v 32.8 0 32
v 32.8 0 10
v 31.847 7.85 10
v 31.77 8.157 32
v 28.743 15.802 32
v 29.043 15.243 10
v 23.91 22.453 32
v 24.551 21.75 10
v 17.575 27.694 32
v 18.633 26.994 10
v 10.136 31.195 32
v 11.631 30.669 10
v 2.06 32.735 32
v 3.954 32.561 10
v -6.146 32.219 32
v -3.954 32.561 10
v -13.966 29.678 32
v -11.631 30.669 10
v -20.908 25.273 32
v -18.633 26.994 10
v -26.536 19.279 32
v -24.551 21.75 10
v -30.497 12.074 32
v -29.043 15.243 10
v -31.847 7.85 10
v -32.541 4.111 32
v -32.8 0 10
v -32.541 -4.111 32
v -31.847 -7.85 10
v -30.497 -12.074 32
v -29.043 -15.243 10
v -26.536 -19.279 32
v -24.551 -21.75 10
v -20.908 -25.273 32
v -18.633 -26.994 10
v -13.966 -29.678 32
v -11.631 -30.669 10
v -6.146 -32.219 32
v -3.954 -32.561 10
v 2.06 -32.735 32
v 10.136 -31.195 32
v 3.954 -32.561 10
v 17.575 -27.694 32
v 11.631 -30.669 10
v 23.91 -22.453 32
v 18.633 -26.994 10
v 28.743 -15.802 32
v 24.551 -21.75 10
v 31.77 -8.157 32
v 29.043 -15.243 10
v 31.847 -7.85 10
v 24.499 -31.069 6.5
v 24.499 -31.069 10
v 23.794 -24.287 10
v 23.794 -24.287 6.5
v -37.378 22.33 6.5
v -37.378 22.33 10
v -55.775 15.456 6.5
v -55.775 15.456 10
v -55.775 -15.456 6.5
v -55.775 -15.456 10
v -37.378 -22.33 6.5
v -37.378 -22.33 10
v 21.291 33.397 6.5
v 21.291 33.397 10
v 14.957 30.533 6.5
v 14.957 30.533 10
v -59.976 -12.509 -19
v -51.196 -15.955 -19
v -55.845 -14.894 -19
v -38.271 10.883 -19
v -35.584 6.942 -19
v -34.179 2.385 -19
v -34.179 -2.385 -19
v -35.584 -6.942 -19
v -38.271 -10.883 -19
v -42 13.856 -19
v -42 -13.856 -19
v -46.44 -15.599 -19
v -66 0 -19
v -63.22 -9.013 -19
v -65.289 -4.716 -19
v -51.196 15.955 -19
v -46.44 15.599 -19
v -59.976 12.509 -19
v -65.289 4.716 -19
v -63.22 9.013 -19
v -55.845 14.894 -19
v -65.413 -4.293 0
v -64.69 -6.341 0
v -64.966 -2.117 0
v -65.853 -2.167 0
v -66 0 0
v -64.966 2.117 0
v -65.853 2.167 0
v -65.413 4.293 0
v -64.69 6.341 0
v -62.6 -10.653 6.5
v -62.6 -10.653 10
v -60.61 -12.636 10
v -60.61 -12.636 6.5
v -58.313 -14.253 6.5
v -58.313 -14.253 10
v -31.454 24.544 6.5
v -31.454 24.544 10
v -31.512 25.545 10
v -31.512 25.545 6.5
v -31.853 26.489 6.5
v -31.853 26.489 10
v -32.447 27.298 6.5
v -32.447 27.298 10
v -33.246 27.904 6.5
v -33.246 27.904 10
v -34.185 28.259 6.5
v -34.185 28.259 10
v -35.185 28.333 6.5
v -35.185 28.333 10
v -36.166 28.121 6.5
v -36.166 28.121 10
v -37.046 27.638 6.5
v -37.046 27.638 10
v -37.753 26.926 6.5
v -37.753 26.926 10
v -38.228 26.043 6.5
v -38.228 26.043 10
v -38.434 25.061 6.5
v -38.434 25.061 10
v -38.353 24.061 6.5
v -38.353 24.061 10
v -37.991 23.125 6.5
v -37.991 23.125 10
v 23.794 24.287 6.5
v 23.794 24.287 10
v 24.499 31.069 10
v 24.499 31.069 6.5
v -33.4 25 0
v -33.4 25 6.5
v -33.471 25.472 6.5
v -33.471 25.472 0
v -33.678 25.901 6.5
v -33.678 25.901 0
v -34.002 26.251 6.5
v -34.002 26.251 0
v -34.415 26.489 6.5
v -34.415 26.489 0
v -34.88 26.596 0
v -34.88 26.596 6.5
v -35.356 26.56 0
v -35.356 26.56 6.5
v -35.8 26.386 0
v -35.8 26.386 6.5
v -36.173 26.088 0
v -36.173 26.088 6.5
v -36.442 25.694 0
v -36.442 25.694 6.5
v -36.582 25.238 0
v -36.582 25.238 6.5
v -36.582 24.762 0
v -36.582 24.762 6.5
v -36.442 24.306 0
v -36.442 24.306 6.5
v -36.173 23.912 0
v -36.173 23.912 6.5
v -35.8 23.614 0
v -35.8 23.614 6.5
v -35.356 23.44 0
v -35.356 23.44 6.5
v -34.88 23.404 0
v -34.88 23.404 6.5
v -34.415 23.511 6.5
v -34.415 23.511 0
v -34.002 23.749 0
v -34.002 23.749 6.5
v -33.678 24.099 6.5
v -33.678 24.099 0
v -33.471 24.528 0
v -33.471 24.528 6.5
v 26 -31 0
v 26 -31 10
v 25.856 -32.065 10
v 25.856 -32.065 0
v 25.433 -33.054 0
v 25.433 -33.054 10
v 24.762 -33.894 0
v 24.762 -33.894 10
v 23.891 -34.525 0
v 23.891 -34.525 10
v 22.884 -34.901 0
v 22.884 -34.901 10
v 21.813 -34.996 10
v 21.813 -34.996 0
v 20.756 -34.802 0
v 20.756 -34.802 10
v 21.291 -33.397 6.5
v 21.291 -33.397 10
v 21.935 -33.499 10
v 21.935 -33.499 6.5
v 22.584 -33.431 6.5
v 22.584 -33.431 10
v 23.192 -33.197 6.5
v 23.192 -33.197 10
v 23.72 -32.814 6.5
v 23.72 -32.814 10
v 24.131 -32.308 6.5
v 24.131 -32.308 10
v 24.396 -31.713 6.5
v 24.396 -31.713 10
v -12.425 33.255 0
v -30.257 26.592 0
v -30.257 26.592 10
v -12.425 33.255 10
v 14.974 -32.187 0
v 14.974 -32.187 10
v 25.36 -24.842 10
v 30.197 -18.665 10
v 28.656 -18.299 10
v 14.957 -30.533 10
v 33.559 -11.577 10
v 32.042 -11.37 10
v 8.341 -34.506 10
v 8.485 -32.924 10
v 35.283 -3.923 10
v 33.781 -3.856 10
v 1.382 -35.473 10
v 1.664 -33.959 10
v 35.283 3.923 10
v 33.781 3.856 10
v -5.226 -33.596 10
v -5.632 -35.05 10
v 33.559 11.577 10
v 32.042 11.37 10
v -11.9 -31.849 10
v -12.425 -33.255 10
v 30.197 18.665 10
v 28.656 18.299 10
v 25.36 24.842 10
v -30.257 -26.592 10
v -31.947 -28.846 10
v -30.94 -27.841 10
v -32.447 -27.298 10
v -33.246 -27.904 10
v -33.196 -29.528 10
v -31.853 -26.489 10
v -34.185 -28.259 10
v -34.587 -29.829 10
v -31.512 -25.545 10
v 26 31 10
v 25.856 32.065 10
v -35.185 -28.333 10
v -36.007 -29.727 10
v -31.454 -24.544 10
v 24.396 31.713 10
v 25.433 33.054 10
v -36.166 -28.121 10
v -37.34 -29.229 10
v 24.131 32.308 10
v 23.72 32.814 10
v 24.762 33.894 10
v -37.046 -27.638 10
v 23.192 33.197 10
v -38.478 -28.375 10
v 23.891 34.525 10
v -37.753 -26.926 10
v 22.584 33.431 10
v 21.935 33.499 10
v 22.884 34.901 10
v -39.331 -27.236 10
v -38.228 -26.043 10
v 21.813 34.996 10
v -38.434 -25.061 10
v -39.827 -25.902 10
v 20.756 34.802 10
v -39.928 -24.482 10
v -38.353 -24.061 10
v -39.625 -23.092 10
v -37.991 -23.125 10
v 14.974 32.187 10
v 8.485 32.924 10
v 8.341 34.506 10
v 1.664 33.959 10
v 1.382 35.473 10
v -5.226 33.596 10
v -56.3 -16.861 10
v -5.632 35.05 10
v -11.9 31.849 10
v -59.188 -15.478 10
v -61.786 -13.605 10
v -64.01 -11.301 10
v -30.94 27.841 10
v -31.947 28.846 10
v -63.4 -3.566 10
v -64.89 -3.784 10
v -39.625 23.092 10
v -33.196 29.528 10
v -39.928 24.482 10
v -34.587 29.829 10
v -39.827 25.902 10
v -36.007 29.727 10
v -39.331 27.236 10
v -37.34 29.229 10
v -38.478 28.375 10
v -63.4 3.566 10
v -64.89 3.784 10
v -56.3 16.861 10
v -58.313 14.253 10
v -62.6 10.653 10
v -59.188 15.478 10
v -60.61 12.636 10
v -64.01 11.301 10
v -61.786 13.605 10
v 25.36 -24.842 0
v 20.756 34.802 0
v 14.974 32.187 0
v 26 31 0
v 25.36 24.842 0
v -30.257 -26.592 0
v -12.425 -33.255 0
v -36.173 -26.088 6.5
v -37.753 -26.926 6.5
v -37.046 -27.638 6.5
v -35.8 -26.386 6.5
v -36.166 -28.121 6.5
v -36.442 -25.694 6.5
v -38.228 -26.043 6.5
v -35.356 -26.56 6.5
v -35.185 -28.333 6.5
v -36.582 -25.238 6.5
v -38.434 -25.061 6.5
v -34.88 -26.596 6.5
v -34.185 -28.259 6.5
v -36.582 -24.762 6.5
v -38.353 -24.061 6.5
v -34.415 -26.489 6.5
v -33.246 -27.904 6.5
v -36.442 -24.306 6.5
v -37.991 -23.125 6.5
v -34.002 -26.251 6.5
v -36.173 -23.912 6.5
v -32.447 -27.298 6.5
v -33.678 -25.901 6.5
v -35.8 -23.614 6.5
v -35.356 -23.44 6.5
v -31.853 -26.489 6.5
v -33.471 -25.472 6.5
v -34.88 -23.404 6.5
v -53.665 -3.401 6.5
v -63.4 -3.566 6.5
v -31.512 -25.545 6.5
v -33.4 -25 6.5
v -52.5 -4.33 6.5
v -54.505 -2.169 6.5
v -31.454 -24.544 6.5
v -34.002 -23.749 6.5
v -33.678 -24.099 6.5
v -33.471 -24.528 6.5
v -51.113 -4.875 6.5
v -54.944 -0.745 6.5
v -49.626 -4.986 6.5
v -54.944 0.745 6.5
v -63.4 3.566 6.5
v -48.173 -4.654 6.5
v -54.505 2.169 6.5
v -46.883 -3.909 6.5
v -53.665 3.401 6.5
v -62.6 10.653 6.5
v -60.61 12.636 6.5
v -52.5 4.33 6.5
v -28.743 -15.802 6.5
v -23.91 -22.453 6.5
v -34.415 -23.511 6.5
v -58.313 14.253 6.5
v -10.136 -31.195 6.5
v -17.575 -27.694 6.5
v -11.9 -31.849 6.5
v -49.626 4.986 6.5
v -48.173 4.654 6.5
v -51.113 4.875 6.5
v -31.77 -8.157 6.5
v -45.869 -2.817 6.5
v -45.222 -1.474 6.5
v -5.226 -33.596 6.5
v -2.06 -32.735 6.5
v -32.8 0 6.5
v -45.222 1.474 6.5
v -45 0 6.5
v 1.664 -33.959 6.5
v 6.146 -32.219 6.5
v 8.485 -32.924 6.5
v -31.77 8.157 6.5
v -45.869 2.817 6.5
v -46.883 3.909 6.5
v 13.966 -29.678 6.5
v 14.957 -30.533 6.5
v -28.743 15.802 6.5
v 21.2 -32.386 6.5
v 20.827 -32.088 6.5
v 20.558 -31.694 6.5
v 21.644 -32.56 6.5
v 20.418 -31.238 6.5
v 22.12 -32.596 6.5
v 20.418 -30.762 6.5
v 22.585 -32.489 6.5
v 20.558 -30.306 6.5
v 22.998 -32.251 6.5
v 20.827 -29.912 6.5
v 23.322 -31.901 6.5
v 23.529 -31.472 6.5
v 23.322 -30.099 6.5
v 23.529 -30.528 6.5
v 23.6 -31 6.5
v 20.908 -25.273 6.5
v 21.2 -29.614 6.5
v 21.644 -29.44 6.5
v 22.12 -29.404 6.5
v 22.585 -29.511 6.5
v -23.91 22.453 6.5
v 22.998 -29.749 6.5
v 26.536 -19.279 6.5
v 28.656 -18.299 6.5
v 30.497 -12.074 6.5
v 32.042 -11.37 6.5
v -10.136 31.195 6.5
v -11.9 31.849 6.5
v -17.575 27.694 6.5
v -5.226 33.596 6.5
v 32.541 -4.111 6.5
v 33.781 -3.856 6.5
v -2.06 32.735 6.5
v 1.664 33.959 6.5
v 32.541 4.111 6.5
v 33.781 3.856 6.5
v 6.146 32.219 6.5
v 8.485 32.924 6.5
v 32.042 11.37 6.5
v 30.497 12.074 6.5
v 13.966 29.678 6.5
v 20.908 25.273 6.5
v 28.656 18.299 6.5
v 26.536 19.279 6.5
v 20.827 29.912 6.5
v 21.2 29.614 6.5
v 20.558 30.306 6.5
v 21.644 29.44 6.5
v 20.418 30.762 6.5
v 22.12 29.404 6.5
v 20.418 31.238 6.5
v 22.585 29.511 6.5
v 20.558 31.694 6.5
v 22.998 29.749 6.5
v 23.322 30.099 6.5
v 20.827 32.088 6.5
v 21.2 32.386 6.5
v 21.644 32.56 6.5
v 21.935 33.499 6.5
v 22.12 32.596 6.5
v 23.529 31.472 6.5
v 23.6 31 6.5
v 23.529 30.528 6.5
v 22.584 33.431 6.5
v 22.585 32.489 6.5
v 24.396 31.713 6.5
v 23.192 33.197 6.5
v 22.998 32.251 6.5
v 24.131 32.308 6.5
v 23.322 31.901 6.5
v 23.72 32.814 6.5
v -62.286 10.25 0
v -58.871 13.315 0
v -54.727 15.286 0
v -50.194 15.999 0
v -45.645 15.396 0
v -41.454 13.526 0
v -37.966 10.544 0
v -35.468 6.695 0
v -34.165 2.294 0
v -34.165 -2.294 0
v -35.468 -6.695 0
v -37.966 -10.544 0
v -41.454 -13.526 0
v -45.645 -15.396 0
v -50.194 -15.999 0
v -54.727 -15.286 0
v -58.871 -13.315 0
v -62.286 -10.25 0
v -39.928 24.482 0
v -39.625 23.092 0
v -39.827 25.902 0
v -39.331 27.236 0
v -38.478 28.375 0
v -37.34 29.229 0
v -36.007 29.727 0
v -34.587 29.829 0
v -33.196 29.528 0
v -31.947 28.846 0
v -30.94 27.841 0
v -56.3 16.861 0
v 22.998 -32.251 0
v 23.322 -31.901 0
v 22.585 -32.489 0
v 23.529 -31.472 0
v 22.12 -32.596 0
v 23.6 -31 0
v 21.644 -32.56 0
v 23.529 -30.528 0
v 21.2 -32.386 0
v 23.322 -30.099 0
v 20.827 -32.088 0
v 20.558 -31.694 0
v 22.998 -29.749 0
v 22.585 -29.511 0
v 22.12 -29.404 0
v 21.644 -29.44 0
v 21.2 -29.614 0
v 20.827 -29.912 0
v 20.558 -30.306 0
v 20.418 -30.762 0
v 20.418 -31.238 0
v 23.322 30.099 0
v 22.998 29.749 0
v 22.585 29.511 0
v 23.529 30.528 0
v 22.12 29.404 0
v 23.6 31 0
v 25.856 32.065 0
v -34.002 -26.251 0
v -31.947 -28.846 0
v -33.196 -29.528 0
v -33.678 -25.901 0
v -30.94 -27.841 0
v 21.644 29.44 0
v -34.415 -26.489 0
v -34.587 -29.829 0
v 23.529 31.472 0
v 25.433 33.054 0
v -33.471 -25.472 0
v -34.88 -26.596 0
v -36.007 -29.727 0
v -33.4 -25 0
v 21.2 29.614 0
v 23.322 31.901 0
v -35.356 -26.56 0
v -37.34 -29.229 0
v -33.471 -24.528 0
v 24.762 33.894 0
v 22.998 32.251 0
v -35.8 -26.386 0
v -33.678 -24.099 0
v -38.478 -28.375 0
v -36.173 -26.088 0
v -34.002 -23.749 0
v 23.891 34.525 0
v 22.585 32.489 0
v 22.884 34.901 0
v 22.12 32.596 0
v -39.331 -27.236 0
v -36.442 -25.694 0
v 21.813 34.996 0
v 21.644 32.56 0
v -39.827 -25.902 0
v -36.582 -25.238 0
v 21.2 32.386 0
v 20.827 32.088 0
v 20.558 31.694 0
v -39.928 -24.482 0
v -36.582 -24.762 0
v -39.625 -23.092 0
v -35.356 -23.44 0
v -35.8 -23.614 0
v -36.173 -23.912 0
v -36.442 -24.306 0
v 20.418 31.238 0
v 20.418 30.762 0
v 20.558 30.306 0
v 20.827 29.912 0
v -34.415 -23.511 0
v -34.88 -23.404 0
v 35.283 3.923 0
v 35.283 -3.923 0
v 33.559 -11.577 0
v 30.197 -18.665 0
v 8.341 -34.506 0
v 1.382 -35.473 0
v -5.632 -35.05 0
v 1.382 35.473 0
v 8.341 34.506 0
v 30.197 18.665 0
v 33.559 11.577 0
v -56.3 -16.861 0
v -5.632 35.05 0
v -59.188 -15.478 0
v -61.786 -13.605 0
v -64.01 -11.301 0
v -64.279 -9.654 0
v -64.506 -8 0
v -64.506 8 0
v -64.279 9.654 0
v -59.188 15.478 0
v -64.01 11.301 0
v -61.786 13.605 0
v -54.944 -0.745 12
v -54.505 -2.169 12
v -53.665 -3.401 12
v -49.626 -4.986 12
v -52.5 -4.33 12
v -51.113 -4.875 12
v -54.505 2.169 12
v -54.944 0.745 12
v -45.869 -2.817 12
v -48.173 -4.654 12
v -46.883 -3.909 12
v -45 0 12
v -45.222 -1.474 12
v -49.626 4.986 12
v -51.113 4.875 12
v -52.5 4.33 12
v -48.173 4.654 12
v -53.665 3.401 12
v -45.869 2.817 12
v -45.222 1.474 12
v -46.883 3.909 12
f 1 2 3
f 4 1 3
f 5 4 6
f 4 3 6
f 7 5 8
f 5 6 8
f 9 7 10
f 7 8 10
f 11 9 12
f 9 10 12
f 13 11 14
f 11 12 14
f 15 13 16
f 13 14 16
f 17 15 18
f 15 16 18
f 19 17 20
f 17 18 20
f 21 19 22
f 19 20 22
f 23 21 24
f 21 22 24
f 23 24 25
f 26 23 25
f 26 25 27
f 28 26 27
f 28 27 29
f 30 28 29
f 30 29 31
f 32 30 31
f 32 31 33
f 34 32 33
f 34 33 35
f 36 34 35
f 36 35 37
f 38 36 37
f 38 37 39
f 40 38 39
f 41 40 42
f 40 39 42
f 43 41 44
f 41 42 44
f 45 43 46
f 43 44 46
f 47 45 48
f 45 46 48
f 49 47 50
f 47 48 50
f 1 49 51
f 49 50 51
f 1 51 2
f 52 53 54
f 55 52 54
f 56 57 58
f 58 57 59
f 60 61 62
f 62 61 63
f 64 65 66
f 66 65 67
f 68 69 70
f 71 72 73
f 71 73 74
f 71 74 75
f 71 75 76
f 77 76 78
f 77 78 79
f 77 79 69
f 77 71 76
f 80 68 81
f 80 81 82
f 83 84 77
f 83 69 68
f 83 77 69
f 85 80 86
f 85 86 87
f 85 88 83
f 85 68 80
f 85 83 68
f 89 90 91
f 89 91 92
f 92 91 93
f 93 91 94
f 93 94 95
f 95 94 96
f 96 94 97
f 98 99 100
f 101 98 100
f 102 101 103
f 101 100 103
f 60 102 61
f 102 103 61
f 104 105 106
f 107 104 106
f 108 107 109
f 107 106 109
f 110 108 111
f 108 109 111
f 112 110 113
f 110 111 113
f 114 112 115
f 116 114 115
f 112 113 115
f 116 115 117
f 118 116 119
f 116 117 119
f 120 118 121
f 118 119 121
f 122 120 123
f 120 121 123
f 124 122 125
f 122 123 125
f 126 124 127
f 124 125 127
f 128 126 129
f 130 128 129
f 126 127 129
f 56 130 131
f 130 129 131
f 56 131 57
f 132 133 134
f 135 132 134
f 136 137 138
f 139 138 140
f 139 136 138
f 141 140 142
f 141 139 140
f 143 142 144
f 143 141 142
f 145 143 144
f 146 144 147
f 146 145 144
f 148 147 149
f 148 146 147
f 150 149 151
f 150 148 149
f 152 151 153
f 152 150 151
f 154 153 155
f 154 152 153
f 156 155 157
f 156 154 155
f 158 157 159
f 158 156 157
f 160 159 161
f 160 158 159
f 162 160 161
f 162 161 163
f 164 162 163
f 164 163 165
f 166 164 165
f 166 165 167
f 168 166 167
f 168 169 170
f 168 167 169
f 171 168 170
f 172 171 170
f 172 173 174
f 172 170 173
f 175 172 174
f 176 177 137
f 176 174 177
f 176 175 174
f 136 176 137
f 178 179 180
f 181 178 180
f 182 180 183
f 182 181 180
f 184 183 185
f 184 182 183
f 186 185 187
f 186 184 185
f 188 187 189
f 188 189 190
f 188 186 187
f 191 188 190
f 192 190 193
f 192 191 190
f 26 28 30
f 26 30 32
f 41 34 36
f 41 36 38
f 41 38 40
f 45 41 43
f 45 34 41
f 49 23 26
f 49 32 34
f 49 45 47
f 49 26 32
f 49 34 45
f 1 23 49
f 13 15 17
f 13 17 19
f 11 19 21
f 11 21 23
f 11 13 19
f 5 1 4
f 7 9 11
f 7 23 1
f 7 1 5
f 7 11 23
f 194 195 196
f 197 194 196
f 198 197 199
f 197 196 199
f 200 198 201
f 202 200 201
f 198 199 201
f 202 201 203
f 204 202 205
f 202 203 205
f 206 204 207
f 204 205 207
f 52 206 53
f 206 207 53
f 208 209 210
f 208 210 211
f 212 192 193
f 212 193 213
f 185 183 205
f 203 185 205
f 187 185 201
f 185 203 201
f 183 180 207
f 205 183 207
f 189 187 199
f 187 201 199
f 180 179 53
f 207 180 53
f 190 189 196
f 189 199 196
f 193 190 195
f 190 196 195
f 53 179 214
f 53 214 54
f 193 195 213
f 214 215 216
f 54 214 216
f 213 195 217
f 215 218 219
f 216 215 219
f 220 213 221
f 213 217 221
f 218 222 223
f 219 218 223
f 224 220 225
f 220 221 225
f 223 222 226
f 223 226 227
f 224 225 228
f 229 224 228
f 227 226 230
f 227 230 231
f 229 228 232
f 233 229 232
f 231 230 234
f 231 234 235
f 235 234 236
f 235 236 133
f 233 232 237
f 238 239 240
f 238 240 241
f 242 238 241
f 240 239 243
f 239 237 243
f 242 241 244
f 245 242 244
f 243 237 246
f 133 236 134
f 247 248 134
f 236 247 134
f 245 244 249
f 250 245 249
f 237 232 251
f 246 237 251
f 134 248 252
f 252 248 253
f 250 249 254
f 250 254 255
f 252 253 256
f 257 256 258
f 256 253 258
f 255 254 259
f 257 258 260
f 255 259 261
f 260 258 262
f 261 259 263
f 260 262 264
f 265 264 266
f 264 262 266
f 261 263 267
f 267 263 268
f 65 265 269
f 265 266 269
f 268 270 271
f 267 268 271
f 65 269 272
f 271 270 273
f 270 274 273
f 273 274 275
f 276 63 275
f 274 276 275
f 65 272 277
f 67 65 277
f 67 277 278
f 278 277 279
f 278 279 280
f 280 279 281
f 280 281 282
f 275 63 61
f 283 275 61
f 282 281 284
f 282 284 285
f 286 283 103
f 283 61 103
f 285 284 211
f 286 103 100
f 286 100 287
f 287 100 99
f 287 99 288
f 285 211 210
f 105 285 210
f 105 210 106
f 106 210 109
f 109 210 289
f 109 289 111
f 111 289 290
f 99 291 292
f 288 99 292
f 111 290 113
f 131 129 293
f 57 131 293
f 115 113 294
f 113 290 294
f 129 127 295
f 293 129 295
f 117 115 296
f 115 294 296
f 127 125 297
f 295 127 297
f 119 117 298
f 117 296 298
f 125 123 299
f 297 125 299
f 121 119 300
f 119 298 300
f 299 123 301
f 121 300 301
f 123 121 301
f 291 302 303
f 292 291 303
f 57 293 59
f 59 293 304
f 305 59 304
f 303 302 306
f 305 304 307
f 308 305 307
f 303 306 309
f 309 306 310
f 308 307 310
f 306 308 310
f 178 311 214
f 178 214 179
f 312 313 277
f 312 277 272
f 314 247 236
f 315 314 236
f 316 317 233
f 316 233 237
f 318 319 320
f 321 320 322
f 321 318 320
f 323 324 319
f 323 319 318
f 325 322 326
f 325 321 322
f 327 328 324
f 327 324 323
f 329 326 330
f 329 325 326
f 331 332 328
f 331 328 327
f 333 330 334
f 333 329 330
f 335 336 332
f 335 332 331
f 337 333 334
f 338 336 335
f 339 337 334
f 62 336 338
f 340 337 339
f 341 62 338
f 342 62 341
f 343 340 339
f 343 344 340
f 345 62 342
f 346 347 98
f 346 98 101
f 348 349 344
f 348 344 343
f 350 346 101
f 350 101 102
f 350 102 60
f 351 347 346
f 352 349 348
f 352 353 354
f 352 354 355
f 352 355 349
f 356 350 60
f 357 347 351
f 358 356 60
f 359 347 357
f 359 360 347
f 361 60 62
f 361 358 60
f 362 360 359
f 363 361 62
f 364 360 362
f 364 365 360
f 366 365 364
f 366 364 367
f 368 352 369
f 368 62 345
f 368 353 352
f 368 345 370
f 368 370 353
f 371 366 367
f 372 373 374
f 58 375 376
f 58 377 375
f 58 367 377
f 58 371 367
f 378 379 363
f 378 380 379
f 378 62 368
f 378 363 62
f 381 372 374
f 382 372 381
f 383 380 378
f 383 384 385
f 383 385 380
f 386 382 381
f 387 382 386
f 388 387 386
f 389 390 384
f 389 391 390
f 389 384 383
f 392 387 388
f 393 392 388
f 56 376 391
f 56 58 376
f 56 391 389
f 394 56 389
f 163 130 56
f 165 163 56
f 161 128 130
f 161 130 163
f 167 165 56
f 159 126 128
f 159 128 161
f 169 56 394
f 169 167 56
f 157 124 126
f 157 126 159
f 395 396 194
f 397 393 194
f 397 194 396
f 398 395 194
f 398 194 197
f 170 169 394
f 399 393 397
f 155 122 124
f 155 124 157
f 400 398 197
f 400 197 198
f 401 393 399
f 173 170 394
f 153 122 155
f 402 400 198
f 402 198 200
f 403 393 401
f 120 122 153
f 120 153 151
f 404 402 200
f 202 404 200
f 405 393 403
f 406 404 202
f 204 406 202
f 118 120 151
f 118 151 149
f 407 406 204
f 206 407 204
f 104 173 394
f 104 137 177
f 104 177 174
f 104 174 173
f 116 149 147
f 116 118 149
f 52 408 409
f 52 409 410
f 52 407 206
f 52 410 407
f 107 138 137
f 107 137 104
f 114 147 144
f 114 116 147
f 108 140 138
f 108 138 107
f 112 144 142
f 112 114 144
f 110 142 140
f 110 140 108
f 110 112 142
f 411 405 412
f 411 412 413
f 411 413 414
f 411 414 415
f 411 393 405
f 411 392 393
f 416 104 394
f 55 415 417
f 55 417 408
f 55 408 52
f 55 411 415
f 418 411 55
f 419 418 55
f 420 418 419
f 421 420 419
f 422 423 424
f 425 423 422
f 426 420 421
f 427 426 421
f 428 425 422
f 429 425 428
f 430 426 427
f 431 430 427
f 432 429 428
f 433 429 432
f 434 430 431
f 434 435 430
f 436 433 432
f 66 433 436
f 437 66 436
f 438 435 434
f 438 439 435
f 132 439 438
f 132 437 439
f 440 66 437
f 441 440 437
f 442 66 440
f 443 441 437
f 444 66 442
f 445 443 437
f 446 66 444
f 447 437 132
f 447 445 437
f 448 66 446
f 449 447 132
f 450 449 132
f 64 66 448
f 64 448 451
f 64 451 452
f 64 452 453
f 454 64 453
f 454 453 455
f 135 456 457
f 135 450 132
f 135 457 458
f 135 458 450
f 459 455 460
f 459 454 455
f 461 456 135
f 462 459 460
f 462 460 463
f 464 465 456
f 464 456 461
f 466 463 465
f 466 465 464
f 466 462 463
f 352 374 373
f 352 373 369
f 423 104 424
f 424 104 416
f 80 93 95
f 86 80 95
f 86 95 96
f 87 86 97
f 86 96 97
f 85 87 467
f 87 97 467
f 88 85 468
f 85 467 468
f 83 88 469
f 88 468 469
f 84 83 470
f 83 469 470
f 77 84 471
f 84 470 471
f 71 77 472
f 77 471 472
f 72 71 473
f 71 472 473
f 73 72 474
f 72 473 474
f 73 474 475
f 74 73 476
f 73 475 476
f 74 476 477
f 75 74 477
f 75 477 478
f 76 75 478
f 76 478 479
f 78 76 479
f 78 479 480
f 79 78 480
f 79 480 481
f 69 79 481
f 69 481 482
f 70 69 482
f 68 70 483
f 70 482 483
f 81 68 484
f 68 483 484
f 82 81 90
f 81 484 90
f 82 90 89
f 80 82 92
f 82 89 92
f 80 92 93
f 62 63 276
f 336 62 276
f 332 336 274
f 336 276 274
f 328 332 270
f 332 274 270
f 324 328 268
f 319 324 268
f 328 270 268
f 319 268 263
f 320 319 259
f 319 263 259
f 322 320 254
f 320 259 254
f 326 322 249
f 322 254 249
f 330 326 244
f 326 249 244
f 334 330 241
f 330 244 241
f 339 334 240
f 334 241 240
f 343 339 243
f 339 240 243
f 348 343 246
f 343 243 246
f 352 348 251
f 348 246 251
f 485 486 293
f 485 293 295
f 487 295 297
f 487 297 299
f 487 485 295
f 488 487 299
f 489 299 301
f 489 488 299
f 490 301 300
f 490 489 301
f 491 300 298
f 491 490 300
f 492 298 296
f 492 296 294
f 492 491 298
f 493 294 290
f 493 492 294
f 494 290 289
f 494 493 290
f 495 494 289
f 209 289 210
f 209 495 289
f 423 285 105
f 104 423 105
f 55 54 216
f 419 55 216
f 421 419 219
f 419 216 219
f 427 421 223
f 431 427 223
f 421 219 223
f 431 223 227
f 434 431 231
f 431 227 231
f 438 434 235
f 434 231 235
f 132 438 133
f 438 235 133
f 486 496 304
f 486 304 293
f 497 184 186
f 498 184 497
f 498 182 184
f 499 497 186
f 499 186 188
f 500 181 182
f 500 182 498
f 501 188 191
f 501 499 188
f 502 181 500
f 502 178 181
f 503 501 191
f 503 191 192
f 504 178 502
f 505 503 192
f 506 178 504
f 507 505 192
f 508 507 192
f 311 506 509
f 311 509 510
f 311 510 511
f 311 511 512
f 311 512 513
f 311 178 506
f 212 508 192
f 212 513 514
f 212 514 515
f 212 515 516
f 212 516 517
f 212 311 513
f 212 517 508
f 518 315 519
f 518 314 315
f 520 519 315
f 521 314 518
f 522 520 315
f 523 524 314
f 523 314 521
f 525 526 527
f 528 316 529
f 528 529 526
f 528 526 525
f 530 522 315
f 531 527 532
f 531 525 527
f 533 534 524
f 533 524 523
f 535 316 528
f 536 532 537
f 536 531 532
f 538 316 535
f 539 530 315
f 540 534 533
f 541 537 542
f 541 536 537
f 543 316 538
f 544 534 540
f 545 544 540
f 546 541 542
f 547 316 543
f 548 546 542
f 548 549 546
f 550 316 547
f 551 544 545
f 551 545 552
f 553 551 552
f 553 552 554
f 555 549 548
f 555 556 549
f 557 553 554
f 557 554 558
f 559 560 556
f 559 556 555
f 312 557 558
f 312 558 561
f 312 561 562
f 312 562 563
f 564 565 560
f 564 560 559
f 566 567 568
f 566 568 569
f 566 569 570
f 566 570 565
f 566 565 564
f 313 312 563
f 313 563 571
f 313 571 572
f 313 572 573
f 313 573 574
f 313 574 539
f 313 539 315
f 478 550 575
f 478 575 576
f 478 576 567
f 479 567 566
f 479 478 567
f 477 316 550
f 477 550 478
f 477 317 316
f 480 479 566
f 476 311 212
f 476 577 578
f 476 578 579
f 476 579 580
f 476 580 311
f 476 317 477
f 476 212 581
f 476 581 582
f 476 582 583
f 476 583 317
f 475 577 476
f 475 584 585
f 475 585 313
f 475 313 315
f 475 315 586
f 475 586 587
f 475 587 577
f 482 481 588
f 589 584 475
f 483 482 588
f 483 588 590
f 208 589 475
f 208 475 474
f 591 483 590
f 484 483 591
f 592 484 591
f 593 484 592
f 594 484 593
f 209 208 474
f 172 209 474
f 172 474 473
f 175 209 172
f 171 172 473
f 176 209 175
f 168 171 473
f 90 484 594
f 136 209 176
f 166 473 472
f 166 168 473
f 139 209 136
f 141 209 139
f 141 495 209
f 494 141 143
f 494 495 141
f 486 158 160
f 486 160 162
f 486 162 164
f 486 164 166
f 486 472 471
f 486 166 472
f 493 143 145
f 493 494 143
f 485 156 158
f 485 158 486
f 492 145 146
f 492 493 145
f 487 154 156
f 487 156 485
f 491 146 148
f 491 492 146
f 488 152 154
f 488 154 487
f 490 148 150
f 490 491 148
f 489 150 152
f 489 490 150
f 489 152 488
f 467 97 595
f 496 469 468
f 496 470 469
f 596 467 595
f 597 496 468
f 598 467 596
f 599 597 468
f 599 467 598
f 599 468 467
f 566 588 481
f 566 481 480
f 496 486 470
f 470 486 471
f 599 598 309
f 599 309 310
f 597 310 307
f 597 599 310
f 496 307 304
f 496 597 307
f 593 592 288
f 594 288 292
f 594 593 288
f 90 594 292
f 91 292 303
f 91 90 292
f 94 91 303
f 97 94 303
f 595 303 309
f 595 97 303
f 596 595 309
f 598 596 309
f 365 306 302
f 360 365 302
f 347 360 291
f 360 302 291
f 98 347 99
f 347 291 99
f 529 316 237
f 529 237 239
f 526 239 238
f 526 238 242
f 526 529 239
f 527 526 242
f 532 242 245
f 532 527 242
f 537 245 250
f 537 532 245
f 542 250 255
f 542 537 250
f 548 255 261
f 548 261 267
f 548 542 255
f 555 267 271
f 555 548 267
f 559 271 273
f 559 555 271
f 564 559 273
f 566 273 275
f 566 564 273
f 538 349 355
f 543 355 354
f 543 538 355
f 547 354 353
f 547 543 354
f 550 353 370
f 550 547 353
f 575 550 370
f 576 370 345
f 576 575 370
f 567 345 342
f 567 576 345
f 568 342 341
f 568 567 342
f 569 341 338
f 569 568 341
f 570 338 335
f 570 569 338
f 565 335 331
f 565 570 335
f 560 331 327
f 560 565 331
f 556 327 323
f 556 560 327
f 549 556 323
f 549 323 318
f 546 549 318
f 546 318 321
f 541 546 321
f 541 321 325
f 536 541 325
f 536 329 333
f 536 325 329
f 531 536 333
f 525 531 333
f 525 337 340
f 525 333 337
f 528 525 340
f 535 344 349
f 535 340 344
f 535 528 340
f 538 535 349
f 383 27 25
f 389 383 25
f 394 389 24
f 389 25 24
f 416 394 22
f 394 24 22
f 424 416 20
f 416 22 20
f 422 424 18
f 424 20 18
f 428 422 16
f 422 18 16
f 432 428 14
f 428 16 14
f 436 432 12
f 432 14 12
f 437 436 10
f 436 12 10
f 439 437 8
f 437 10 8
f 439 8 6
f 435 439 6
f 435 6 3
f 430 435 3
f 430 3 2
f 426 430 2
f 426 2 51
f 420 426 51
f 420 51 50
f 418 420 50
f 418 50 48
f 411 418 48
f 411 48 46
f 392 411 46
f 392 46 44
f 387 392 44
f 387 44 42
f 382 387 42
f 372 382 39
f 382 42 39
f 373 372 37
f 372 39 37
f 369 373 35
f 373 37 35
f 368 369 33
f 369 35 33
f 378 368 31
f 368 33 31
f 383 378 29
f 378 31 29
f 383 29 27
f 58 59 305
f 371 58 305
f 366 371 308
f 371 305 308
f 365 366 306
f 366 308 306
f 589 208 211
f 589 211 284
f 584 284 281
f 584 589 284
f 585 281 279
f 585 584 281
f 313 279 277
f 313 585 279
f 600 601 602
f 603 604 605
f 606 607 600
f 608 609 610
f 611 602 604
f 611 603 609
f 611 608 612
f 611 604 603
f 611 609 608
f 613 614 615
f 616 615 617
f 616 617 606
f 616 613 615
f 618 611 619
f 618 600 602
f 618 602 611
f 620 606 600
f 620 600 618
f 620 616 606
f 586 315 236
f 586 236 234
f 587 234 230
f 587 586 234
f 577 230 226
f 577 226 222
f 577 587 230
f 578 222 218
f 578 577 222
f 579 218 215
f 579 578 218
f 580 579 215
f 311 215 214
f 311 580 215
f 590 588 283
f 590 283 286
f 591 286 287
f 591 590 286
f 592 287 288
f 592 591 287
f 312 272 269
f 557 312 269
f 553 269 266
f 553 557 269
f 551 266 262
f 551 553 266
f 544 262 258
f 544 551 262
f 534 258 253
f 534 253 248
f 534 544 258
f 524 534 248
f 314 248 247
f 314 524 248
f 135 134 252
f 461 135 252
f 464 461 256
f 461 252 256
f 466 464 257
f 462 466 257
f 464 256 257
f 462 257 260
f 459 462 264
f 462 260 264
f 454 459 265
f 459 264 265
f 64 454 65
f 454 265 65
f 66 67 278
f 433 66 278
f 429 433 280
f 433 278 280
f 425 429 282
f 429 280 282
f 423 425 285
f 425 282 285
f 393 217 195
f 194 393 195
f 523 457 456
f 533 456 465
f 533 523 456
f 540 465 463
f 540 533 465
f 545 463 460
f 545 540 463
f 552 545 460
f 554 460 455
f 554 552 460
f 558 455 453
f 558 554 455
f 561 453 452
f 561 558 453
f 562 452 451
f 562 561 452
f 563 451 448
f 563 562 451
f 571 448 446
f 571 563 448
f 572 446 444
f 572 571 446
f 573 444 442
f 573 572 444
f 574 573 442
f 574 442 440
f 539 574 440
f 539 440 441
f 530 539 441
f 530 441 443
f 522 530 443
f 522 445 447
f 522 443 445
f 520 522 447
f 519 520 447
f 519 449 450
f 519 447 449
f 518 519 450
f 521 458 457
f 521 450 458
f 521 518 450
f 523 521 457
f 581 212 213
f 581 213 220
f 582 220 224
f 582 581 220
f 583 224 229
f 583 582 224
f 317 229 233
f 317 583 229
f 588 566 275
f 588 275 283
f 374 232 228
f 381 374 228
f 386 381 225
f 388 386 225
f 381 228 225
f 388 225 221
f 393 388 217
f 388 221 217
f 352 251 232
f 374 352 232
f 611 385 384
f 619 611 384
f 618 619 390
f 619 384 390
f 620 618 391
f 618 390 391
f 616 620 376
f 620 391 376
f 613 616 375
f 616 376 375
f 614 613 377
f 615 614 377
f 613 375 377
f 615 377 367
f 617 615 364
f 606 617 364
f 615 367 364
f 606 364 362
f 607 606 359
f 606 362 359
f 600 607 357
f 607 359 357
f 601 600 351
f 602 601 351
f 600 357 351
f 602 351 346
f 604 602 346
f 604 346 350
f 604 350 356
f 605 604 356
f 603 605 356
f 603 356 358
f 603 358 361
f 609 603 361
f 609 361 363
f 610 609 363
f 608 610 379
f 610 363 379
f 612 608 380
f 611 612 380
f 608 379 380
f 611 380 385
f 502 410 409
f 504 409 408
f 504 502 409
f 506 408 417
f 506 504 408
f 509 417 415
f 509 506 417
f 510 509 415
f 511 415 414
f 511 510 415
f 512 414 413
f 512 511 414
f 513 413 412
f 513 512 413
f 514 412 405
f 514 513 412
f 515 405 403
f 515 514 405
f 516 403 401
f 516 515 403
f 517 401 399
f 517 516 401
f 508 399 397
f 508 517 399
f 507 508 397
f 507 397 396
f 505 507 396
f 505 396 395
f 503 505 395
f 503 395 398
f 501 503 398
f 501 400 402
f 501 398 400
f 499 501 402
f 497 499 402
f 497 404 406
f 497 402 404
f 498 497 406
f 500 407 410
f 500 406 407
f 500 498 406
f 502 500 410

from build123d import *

# Parameters (mm, degrees)
ESQUISSE1_R             = 1.6
BOSS_EXTRU_1_DEPTH      = 10
ESQUISSE2_R             = 32.8
BOSS_EXTRU_2_DEPTH      = 22
ENL_V_MAT_EXTRU_1_DEPTH = 3.5
BOSS_EXTRU_3_REACH      = 12
ESQUISSE4_R             = 32.8
ESQUISSE5_R             = 16
BOSS_EXTRU_4_DEPTH      = 19
ESQUISSE8_R             = 5
BOSS_EXTRU_7_DEPTH      = 5.5


with BuildPart() as part:
    # Esquisse1 → Boss.-Extru.1 (new body)
    with BuildSketch(Plane.XY):
        with BuildLine():
            ThreePointArc((-56.3, -16.861494596), (-60.528670487, -14.599558136), (-64.01, -11.301322931))
            ThreePointArc((-64.01, -11.301322931), (-65, 0), (-64.01, 11.301322931))
            ThreePointArc((-64.01, 11.301322931), (-60.528670487, 14.599558136), (-56.3, 16.861494596))
            Line((-56.3, 16.861494596), (-39.624688626, 23.091930519))
            ThreePointArc((-39.624688626, 23.091930519), (-36.690940127, 29.525679018), (-30.257191628, 26.591930519))
            Line((-30.257191628, 26.591930519), (-12.425, 33.254614341))
            ThreePointArc((-12.425, 33.254614341), (1.381675102, 35.473102119), (14.973963383, 32.187426436))
            Line((14.973963383, 32.187426436), (20.756023105, 34.801647207))
            ThreePointArc((20.756023105, 34.801647207), (24.347774736, 34.238511045), (26, 31))
            Line((26, 31), (25.359978077, 24.841930519))
            ThreePointArc((25.359978077, 24.841930519), (35.5, 0), (25.359978077, -24.841930519))
            Line((25.359978077, -24.841930519), (26, -31))
            ThreePointArc((26, -31), (24.347774736, -34.238511045), (20.756023105, -34.801647207))
            Line((20.756023105, -34.801647207), (14.973963383, -32.187426436))
            ThreePointArc((14.973963383, -32.187426436), (1.381675102, -35.473102119), (-12.425, -33.254614341))
            Line((-12.425, -33.254614341), (-30.257191628, -26.591930519))
            ThreePointArc((-30.257191628, -26.591930519), (-36.690940127, -29.525679018), (-39.624688626, -23.091930519))
            Line((-39.624688626, -23.091930519), (-56.3, -16.861494596))
        make_face()
        with Locations((-35, -25)):
            Circle(ESQUISSE1_R, mode=Mode.SUBTRACT)
        with Locations((22, 31)):
            Circle(ESQUISSE1_R, mode=Mode.SUBTRACT)
        with Locations((-35, 25)):
            Circle(ESQUISSE1_R, mode=Mode.SUBTRACT)
        with Locations((22, -31)):
            Circle(ESQUISSE1_R, mode=Mode.SUBTRACT)
    extrude(amount=BOSS_EXTRU_1_DEPTH)

    # Esquisse2 → Boss.-Extru.2 (add)
    with BuildSketch(Plane.XY.offset(10)):
        Circle(ESQUISSE2_R)
    extrude(amount=BOSS_EXTRU_2_DEPTH)

    # Esquisse3 → Enlèv. mat.-Extru.1 (cut)
    with BuildSketch(Plane.XY.offset(10)):
        with BuildLine():
            Line((-55.775, -15.456370046), (-37.378202776, -22.330008789))
            ThreePointArc((-37.378202776, -22.330008789), (-36.165940127, -28.120554469), (-31.453677478, -24.543603151))
            Line((-31.453677478, -24.543603151), (-11.9, -31.849489792))
            ThreePointArc((-11.9, -31.849489792), (1.664031028, -33.959255009), (14.956816294, -30.533484019))
            Line((14.956816294, -30.533484019), (21.291141631, -33.397398551))
            ThreePointArc((21.291141631, -33.397398551), (23.468656713, -33.023128137), (24.499056843, -31.06866508))
            Line((24.499056843, -31.06866508), (23.79417774, -24.286562245))
            ThreePointArc((23.79417774, -24.286562245), (34, 0), (23.79417774, 24.286562245))
            Line((23.79417774, 24.286562245), (24.499056843, 31.06866508))
            ThreePointArc((24.499056843, 31.06866508), (23.468656713, 33.023128137), (21.291141631, 33.397398551))
            Line((21.291141631, 33.397398551), (14.956816294, 30.533484019))
            ThreePointArc((14.956816294, 30.533484019), (1.664031028, 33.959255009), (-11.9, 31.849489792))
            Line((-11.9, 31.849489792), (-31.453677478, 24.543603151))
            ThreePointArc((-31.453677478, 24.543603151), (-36.165940127, 28.120554469), (-37.378202776, 22.330008789))
            Line((-37.378202776, 22.330008789), (-55.775, 15.456370046))
            ThreePointArc((-55.775, 15.456370046), (-59.496201473, 13.493411636), (-62.6, 10.653168543))
            ThreePointArc((-62.6, 10.653168543), (-63.5, 0), (-62.6, -10.653168543))
            ThreePointArc((-62.6, -10.653168543), (-59.496201473, -13.493411636), (-55.775, -15.456370046))
        make_face()
    extrude(amount=-ENL_V_MAT_EXTRU_1_DEPTH, mode=Mode.SUBTRACT)

    # Esquisse4 → Boss.-Extru.3 (add, up to next)
    with BuildSketch(Plane(origin=(0, 0, 10), x_dir=(-1, 0, 0), z_dir=(0, 0, -1)), mode=Mode.PRIVATE) as boss_extru_3_sk1:
        Circle(ESQUISSE4_R)
    boss_extru_3_tool1 = extrude(boss_extru_3_sk1.sketch, amount=BOSS_EXTRU_3_REACH, mode=Mode.PRIVATE) - part.part
    add(boss_extru_3_tool1.solids().sort_by_distance((0, 0, 10))[0])

    # Esquisse5 → Boss.-Extru.4 (add)
    with BuildSketch(Plane(origin=(0, 0, 0), x_dir=(-1, 0, 0), z_dir=(0, 0, -1))):
        with Locations((50, 0)):
            Circle(ESQUISSE5_R)
    extrude(amount=BOSS_EXTRU_4_DEPTH)

    # Esquisse8 → Boss.-Extru.7 (add)
    with BuildSketch(Plane.XY.offset(6.5)):
        with Locations((-50, 0)):
            Circle(ESQUISSE8_R)
    extrude(amount=BOSS_EXTRU_7_DEPTH)


solid = part.part
